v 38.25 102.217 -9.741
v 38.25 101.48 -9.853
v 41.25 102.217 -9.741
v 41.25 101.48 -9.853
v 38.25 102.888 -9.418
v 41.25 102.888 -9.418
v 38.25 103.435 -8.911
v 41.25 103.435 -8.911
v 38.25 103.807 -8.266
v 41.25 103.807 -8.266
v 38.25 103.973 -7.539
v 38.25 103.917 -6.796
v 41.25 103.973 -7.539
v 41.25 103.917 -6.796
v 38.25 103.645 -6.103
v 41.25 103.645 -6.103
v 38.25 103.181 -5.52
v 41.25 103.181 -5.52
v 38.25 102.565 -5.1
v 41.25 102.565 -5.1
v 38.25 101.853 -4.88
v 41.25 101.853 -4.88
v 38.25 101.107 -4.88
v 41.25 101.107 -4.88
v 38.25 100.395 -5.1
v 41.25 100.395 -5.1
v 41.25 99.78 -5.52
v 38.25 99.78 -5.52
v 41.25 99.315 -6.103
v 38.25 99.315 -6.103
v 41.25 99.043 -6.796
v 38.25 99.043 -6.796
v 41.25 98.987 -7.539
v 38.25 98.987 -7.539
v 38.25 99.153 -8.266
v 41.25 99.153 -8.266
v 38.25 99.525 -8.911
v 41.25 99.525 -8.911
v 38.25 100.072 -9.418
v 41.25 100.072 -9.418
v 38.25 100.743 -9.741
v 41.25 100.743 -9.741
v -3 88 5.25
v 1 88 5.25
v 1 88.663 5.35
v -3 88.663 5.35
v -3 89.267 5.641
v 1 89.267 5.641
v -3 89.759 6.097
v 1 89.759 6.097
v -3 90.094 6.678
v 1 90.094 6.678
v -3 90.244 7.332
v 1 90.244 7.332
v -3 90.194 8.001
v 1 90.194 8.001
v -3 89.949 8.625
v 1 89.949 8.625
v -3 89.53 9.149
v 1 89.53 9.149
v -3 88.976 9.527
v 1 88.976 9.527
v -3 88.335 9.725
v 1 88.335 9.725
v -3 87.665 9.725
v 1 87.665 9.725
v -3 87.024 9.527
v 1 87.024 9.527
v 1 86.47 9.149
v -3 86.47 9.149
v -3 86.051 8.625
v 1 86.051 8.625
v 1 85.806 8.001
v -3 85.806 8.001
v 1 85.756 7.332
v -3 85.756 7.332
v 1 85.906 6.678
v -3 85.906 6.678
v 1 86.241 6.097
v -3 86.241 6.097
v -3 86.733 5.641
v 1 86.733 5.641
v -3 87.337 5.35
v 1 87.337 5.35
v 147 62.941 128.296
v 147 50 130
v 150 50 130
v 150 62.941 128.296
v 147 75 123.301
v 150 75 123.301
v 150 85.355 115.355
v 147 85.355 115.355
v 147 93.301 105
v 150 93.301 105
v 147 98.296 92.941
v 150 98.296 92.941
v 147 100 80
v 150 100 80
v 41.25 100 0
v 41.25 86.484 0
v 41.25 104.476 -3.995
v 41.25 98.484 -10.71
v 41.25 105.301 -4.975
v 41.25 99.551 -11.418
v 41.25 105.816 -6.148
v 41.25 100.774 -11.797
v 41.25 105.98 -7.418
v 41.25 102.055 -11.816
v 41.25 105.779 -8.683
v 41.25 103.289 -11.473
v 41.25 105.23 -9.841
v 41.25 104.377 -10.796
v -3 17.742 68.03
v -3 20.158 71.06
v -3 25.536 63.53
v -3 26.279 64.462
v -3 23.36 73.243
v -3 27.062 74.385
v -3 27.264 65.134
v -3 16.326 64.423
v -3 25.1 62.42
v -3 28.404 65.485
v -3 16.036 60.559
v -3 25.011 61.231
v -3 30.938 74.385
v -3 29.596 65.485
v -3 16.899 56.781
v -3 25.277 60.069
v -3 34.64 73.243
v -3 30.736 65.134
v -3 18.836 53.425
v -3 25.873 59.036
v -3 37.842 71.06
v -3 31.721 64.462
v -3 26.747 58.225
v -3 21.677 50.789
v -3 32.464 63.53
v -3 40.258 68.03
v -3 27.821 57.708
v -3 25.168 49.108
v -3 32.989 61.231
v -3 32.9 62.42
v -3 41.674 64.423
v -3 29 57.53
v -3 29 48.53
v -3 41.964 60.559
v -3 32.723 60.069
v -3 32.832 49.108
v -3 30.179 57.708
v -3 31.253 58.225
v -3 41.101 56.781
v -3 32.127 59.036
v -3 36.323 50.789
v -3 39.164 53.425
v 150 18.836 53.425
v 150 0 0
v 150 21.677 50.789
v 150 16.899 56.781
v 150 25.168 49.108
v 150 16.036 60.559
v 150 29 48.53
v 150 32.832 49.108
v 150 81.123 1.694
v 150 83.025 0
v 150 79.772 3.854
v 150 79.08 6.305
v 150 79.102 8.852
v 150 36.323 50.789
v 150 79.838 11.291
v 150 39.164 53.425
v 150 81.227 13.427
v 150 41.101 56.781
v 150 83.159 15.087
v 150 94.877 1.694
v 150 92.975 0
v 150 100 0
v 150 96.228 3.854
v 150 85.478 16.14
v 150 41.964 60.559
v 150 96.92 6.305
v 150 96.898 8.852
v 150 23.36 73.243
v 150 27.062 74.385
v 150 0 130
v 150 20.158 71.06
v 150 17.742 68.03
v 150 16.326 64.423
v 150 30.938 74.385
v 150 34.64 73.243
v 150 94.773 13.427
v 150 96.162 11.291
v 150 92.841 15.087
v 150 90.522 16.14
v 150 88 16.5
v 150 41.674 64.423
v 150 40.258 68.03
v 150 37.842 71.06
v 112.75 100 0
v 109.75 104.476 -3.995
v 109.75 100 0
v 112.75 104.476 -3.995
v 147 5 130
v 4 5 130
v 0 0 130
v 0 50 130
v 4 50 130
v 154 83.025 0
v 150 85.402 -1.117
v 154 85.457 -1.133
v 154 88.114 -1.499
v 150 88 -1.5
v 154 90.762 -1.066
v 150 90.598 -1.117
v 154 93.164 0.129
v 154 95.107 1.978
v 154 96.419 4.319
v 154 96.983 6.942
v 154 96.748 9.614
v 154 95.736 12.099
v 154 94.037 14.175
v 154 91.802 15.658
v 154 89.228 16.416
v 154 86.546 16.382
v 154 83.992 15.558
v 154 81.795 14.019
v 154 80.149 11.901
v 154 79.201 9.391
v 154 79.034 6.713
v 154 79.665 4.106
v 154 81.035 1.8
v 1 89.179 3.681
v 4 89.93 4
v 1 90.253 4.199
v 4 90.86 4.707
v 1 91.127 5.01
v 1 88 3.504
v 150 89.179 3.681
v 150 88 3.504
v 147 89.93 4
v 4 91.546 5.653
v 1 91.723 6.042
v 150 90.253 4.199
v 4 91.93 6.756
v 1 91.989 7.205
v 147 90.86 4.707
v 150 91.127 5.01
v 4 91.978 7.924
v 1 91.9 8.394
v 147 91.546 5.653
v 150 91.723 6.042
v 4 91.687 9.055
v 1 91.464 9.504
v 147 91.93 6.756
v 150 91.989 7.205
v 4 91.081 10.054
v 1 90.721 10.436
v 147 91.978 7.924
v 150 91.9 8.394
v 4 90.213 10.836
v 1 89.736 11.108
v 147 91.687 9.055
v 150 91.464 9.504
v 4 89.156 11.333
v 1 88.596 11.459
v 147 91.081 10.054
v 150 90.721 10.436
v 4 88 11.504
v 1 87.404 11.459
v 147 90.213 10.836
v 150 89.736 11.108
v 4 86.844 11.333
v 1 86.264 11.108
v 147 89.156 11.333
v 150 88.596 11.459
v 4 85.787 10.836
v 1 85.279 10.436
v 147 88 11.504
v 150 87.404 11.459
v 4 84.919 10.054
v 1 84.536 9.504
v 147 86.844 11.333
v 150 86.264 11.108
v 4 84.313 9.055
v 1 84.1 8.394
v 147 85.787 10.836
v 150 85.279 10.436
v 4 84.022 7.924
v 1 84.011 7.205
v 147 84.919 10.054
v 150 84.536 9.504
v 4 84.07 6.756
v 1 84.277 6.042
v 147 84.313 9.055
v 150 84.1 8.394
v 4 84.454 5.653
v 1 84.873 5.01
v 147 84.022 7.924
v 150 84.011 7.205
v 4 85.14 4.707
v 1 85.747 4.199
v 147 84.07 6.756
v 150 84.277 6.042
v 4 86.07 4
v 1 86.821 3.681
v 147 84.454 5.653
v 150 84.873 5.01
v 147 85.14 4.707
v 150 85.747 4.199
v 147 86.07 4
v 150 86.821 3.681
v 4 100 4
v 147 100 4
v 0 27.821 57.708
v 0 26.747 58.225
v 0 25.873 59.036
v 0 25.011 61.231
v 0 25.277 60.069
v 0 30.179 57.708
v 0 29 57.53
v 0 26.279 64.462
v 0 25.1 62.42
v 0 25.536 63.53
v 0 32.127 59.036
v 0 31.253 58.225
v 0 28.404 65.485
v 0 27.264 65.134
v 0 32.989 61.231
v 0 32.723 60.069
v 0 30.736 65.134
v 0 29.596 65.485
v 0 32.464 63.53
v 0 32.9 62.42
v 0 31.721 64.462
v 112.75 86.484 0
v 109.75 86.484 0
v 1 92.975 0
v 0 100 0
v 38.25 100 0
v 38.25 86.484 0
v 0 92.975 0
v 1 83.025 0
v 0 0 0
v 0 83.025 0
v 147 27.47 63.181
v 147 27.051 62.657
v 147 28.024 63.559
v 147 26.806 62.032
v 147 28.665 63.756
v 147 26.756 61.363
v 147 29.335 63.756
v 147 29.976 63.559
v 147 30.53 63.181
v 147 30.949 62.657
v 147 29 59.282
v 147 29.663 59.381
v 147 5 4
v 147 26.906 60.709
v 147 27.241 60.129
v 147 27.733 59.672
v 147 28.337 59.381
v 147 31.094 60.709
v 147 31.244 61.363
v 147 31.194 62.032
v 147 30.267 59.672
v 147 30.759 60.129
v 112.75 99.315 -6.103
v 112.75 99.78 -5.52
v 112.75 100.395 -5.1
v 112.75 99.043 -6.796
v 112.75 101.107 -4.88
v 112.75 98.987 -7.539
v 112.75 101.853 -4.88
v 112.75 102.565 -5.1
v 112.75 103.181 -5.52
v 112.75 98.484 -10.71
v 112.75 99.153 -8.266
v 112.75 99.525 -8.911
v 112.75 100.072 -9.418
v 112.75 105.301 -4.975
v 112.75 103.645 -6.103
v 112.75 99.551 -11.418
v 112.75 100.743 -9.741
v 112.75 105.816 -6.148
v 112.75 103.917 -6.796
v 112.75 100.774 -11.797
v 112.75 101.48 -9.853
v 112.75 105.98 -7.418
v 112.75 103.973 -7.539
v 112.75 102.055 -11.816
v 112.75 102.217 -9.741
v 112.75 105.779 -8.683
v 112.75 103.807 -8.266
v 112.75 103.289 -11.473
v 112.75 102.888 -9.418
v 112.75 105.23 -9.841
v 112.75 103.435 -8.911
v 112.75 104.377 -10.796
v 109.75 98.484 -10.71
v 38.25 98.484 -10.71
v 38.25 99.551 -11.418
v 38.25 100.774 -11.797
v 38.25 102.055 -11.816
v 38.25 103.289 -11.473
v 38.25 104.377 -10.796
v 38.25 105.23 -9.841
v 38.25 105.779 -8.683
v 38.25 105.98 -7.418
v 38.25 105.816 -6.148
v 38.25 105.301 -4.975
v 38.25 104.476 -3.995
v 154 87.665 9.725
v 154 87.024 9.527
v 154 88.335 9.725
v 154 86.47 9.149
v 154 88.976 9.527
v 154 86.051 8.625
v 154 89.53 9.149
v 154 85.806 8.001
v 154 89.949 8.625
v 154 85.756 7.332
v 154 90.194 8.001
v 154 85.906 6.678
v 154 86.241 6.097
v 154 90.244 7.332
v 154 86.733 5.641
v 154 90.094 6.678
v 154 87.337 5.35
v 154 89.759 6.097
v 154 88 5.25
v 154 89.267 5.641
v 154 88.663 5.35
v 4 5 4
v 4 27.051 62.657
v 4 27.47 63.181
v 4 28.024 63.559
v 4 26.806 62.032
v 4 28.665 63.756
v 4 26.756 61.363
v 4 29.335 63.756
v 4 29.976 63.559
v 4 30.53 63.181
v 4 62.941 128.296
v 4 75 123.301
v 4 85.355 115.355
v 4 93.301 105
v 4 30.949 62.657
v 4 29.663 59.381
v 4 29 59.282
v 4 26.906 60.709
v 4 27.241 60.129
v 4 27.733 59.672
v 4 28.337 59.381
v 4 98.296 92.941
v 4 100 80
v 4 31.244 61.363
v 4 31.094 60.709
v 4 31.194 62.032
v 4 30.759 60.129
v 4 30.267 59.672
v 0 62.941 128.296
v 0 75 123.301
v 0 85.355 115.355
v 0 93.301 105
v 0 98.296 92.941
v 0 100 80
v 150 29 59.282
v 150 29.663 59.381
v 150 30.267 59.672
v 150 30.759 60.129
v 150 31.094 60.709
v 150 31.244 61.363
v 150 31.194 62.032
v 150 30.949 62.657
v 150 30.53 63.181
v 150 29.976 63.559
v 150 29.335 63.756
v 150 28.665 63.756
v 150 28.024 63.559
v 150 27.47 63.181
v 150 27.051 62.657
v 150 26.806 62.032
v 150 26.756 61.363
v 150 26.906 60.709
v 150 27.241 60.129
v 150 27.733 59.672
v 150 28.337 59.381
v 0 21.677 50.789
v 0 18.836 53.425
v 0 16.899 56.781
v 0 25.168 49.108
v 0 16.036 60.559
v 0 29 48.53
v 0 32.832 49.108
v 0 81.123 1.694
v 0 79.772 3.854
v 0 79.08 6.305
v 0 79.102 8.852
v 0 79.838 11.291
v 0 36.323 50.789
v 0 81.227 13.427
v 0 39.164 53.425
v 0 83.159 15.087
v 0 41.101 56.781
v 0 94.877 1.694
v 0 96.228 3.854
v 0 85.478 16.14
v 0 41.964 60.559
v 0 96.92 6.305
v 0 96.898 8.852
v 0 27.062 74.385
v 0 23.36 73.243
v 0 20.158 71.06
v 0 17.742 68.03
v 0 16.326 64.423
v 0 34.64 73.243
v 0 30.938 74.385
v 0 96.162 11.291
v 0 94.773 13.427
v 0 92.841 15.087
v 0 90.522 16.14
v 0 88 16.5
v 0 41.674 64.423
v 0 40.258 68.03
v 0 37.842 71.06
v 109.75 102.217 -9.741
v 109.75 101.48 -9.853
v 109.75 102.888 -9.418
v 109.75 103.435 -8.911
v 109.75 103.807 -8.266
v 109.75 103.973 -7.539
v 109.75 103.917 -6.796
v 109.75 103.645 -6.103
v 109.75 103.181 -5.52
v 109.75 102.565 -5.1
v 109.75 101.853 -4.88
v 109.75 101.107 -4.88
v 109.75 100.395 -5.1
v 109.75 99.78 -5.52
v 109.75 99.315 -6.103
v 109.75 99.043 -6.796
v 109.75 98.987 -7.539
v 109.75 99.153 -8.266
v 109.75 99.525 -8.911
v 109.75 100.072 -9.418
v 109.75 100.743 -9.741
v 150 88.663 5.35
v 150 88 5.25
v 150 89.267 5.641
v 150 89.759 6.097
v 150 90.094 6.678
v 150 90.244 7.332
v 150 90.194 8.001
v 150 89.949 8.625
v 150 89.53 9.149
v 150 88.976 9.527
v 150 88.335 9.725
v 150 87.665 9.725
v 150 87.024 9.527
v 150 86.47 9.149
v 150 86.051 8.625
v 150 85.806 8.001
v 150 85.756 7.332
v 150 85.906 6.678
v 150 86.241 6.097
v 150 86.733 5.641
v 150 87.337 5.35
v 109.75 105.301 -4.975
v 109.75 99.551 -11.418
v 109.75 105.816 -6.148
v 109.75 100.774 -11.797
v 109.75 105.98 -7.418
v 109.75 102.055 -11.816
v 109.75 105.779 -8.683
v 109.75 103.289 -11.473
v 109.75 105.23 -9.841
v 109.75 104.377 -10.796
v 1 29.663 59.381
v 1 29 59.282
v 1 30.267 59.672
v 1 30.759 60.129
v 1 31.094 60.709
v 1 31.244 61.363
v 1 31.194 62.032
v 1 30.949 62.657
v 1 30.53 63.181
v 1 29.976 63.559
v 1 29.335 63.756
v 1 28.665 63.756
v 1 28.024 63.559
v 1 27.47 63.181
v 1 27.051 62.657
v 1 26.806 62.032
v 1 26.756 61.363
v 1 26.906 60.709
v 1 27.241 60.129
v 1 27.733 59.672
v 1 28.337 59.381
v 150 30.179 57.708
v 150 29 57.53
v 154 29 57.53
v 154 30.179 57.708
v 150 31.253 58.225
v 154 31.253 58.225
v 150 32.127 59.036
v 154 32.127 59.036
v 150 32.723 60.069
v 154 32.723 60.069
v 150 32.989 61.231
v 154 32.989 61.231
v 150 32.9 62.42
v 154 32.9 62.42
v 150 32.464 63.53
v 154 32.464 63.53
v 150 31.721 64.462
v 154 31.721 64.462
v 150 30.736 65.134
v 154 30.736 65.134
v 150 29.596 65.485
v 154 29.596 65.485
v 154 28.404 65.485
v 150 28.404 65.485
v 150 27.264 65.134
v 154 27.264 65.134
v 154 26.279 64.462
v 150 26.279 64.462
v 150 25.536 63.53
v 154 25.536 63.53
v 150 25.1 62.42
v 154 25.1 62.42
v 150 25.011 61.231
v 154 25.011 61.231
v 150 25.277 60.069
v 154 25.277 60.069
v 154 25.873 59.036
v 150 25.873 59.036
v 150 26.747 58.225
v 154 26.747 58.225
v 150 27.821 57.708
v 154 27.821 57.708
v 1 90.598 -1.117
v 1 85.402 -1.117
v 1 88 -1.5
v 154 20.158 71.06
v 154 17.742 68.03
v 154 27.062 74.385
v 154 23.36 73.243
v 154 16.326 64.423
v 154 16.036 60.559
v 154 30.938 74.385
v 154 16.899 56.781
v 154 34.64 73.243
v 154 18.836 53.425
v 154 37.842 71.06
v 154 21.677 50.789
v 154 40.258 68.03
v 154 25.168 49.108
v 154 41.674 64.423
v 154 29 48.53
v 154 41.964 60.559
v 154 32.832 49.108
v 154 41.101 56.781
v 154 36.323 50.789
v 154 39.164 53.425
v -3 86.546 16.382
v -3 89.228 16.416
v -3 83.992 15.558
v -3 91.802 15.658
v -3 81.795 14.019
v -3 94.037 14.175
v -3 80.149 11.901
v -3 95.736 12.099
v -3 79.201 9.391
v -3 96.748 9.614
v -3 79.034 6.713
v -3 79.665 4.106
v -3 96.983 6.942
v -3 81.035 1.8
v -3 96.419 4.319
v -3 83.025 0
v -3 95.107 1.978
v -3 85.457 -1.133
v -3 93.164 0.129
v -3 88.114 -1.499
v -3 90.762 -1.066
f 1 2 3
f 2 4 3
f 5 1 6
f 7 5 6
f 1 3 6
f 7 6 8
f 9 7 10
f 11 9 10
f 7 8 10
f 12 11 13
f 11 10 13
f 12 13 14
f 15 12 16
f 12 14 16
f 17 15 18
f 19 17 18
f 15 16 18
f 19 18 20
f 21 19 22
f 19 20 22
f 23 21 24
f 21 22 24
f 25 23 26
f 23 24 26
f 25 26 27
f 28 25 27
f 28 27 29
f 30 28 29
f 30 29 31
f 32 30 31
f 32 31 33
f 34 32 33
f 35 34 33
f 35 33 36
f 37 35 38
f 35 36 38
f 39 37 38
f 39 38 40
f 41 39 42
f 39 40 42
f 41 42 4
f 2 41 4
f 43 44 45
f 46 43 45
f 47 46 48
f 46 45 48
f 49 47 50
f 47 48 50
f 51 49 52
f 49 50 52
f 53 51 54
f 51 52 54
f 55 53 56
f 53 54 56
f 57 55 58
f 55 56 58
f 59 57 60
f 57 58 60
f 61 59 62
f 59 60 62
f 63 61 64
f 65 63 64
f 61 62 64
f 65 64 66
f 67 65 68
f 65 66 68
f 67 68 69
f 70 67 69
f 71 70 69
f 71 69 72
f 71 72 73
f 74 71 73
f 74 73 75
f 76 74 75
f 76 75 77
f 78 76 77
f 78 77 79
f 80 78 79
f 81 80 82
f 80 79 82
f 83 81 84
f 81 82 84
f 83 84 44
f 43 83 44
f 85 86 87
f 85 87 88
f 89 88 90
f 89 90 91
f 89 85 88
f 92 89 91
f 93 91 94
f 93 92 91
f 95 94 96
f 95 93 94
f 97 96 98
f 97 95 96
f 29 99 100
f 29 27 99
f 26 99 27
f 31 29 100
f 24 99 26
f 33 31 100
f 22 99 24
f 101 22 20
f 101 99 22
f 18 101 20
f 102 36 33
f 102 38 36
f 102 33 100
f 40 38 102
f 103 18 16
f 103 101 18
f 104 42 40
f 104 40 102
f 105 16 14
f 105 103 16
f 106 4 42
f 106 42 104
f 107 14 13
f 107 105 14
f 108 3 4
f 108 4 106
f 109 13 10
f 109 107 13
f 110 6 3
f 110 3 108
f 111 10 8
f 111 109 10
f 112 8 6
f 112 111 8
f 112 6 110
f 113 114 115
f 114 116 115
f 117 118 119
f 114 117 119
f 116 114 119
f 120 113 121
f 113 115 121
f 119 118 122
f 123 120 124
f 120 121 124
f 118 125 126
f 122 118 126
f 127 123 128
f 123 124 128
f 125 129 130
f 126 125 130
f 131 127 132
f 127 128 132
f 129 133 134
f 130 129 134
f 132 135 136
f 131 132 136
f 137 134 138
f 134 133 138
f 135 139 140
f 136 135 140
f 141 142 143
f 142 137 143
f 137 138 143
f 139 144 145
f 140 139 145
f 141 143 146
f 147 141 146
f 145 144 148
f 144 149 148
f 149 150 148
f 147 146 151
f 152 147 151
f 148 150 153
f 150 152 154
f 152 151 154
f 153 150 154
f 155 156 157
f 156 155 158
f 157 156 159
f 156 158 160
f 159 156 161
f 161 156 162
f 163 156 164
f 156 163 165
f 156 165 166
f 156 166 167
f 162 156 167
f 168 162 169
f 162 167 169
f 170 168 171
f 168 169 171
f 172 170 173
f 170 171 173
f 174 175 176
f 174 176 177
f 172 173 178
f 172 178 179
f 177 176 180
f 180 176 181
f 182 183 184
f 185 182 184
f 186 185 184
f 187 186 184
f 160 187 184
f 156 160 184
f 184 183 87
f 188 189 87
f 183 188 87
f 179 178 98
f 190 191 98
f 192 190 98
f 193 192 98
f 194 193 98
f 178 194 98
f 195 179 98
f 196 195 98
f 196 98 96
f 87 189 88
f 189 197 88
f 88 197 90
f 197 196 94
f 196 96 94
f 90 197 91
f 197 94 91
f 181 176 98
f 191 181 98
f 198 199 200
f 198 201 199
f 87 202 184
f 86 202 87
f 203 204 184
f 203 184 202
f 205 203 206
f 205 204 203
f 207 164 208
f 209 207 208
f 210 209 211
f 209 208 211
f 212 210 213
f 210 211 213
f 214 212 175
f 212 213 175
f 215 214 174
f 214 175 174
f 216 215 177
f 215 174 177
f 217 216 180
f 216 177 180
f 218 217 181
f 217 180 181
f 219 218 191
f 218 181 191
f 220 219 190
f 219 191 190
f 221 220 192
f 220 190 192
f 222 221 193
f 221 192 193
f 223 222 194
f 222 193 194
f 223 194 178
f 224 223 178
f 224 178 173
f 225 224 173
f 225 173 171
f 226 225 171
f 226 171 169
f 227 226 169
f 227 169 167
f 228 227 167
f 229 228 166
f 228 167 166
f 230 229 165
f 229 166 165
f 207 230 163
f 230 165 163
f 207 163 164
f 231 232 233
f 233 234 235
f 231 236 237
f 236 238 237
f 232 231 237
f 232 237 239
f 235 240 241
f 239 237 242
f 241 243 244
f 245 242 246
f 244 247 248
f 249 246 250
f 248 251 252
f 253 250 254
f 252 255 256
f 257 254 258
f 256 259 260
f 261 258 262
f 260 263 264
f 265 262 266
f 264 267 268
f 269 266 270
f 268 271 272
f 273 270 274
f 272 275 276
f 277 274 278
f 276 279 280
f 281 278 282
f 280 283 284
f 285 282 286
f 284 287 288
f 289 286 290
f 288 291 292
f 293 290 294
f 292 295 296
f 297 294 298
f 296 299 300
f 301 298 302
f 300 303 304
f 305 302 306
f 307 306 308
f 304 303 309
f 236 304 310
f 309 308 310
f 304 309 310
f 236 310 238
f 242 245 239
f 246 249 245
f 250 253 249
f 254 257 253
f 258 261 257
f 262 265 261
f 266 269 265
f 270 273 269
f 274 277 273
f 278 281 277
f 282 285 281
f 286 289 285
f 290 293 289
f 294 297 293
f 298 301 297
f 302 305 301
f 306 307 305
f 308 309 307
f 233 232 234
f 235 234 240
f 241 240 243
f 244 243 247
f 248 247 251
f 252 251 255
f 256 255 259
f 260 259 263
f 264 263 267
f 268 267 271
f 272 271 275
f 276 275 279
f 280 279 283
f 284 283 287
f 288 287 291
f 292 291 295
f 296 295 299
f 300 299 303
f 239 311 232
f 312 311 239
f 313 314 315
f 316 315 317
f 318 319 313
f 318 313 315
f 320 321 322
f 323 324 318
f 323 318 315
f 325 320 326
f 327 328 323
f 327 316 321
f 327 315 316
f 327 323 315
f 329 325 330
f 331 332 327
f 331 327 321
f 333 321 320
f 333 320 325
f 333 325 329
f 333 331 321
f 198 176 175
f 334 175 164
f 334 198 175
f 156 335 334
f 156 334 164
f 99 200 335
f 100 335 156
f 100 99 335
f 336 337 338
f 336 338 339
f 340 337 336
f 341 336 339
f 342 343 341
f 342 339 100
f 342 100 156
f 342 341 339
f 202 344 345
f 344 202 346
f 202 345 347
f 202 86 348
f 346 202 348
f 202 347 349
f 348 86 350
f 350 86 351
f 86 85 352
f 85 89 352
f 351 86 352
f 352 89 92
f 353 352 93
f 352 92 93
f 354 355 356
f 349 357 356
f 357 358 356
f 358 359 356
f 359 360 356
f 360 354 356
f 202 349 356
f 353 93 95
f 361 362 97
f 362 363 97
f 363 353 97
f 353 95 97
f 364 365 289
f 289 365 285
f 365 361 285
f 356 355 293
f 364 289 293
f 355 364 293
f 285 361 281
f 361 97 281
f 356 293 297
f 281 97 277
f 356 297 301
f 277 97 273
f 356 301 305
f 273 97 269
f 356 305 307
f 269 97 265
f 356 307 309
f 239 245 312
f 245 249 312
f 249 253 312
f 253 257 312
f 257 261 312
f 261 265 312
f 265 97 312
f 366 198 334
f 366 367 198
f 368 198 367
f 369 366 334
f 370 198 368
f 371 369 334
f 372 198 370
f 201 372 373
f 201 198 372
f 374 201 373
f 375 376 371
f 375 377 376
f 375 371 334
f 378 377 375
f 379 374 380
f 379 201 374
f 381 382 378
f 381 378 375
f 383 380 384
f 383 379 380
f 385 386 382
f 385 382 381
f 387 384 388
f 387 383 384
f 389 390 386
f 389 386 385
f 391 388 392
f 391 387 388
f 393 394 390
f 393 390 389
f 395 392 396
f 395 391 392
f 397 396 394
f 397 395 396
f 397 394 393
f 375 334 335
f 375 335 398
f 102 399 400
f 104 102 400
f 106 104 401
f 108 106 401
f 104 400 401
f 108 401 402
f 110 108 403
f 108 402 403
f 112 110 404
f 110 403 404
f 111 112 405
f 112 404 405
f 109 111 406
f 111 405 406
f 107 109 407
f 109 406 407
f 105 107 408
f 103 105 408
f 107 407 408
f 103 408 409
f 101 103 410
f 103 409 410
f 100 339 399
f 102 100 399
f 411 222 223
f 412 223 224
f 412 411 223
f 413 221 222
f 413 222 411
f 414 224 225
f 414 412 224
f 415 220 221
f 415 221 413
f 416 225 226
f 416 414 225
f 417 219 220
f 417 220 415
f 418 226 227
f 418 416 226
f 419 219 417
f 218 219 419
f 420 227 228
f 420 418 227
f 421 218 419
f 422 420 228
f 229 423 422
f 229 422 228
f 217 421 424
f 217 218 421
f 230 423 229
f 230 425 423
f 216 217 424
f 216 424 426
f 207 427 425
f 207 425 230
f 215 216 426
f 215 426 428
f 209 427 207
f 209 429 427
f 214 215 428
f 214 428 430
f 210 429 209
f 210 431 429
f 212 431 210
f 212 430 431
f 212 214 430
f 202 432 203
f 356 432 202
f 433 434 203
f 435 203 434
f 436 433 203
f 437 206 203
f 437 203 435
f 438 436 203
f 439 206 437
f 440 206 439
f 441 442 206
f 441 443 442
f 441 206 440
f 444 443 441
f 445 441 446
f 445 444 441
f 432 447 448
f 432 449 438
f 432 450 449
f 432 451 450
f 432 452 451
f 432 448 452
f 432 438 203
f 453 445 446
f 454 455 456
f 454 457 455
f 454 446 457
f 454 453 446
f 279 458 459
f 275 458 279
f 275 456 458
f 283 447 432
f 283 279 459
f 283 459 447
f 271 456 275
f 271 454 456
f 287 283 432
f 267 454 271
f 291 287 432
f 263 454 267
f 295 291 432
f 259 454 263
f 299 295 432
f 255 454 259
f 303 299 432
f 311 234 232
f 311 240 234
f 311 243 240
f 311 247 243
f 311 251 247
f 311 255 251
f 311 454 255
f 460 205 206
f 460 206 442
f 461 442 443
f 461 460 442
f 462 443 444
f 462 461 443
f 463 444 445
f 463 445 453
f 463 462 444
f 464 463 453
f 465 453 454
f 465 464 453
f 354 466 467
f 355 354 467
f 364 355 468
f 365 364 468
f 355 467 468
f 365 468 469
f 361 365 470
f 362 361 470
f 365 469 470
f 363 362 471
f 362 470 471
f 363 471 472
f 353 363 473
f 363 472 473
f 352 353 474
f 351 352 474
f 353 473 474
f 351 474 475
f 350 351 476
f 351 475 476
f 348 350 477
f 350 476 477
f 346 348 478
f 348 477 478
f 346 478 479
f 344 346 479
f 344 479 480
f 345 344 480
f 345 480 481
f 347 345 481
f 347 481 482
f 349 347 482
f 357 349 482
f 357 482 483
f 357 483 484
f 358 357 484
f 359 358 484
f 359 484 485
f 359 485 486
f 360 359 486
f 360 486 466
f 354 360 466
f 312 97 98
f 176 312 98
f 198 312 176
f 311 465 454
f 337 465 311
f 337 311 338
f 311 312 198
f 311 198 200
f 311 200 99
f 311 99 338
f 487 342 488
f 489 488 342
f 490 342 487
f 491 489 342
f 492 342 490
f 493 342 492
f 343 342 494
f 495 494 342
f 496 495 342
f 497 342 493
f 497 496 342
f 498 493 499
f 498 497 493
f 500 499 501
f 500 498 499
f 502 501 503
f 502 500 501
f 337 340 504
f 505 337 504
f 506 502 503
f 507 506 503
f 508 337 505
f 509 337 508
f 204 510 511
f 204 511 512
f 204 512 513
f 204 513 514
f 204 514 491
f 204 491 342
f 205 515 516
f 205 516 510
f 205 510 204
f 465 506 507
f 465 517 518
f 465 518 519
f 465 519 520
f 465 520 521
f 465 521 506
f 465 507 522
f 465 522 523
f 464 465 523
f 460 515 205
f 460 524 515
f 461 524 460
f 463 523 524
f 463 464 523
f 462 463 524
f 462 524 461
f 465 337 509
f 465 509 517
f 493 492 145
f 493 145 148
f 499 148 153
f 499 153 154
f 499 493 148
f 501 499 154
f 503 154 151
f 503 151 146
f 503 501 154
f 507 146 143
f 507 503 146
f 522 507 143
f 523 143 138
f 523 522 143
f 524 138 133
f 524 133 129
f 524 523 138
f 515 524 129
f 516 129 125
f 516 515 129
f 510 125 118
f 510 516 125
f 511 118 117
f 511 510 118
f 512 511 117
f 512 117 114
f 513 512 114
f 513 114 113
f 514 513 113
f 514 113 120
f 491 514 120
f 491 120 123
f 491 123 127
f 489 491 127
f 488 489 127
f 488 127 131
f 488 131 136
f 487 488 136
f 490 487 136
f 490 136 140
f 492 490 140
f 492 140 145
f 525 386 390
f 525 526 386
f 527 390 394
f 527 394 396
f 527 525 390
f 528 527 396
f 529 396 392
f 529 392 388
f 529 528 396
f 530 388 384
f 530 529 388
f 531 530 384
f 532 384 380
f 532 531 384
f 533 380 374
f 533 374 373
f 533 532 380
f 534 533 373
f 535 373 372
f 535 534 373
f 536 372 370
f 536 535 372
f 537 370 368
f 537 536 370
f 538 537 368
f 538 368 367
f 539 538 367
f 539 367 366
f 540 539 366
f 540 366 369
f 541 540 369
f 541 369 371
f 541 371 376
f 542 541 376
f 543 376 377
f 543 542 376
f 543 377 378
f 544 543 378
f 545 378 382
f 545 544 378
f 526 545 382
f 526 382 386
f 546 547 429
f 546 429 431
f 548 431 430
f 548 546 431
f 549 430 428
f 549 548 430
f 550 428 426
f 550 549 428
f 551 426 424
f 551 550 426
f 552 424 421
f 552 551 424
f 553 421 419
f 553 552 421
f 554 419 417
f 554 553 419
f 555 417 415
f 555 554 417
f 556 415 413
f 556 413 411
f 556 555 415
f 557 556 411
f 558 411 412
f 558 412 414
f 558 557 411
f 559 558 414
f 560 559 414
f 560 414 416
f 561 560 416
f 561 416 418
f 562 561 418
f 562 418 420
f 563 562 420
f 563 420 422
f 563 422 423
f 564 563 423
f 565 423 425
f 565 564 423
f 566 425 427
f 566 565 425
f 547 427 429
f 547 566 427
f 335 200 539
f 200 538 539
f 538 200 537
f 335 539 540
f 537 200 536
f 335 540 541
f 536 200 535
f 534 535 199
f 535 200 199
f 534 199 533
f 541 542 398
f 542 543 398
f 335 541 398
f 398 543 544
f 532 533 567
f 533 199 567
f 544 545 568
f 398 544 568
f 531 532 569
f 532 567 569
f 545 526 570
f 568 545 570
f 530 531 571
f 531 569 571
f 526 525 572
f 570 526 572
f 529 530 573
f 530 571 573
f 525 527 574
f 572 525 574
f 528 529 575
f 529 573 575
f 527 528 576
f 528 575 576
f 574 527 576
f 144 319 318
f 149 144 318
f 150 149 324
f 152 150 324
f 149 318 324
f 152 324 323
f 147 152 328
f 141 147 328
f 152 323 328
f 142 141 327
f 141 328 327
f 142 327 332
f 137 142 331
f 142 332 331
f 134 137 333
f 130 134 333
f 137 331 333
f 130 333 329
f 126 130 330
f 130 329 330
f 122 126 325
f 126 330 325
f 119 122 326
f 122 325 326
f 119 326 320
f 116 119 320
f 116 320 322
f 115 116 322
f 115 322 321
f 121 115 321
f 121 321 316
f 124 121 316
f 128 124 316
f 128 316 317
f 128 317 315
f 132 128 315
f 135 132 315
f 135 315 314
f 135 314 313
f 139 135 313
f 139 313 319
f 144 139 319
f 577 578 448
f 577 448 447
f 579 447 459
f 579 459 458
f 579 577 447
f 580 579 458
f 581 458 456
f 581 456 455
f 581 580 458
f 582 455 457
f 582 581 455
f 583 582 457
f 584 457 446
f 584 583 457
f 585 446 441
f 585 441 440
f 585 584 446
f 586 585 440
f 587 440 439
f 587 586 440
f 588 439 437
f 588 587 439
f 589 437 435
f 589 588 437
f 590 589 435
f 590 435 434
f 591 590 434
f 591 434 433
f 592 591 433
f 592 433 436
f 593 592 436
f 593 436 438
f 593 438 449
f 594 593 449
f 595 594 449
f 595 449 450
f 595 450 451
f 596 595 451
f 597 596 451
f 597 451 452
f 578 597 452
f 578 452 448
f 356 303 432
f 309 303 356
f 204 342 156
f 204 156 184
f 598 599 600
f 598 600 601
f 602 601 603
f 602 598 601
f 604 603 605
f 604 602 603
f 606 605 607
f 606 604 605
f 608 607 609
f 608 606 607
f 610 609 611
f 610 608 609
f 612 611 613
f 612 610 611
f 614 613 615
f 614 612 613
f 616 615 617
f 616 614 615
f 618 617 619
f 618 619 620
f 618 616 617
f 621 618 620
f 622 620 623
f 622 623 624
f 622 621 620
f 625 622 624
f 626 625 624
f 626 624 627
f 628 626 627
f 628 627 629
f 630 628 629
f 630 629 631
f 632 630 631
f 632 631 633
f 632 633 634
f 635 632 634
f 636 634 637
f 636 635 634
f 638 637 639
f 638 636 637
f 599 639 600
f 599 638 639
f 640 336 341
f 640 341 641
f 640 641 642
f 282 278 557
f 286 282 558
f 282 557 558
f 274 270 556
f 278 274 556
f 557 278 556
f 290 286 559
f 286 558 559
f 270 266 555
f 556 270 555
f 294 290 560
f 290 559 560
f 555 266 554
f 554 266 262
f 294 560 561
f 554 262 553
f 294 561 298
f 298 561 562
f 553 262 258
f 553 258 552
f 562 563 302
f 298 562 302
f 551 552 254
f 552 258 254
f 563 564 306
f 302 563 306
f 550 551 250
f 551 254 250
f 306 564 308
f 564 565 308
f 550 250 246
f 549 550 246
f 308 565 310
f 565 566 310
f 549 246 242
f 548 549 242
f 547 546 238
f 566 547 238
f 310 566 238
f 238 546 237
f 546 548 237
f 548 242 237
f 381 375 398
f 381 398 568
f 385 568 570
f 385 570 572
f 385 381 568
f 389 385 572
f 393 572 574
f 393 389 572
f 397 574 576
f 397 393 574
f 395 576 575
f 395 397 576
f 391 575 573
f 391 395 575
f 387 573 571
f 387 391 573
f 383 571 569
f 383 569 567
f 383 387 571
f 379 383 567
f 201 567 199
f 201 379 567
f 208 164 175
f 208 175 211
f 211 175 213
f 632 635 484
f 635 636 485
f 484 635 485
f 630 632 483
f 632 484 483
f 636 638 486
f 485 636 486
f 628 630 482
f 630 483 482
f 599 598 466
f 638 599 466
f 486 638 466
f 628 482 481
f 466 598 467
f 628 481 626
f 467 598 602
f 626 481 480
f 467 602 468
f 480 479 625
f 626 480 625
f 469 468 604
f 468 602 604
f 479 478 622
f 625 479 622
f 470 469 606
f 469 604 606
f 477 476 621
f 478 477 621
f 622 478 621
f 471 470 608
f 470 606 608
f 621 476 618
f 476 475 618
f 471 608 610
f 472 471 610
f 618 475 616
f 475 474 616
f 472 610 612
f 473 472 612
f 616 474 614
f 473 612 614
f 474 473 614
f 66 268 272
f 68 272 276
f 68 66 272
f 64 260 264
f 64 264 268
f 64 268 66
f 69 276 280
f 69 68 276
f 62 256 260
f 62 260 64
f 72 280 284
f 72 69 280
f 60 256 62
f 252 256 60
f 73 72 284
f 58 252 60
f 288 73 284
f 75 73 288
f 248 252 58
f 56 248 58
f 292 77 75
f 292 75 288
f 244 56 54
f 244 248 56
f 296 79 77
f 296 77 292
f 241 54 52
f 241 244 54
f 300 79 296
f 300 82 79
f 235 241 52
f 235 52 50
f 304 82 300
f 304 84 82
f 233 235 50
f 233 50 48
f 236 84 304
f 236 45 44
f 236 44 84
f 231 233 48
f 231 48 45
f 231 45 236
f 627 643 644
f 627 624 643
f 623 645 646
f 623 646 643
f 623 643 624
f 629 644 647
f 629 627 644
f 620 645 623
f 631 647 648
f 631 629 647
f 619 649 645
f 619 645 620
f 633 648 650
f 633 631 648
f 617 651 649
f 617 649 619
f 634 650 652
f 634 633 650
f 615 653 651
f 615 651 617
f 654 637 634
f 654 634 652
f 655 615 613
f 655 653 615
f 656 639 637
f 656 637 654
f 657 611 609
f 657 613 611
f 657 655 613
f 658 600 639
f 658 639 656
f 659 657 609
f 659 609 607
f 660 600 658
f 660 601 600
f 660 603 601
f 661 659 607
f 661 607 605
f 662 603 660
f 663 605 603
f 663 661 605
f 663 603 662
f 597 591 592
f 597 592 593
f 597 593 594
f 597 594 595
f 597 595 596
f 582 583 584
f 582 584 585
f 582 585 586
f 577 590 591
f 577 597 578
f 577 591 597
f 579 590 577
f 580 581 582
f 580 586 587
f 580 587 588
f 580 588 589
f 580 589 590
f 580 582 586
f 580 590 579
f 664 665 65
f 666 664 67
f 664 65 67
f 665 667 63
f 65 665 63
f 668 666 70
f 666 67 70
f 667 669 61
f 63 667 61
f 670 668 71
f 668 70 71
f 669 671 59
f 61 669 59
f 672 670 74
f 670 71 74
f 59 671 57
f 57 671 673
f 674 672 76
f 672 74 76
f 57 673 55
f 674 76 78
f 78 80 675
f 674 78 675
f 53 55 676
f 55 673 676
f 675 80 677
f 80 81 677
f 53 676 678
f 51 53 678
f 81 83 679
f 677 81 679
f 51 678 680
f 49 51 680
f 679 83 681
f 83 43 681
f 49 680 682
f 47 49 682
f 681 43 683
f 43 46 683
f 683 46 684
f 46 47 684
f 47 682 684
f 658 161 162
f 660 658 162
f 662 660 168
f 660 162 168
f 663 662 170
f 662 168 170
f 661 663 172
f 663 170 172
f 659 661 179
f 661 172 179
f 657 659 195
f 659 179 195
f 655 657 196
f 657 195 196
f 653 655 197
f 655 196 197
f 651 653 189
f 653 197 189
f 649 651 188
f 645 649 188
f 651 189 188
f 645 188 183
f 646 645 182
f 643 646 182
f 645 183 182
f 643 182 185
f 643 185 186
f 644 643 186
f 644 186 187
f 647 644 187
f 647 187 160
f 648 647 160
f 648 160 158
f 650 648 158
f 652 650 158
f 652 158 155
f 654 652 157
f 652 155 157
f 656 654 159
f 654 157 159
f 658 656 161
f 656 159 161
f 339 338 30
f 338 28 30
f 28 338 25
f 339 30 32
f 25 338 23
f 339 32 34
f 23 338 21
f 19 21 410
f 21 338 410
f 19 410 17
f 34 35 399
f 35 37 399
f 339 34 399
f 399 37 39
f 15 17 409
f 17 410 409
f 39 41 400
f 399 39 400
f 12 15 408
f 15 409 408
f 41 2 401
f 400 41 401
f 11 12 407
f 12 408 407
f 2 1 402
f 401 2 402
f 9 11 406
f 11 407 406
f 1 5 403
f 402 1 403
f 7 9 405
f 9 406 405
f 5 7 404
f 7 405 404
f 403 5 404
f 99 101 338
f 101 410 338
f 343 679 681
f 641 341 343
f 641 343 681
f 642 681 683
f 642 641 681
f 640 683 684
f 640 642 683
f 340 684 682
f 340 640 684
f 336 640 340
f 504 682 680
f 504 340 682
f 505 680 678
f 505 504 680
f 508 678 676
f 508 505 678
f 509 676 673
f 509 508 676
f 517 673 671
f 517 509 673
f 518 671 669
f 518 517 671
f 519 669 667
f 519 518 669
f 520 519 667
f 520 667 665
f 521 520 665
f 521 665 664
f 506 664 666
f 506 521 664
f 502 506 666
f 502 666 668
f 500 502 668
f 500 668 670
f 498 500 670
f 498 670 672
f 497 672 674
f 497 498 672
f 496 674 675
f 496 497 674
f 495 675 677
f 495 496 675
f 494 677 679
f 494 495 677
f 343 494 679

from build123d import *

# Parameters (mm, degrees)
BOSS_EXTRUDE1_DEPTH = 150
SKETCH2_W           = 143
SKETCH2_H           = 131
CUT_EXTRUDE1_DEPTH  = 95
SKETCH3_R           = 2.5
BOSS_EXTRUDE2_DEPTH = 1.5
CUT_EXTRUDE2_REACH  = 227.015
SKETCH4_R           = 2.25
SKETCH4_R_2         = 4
SKETCH5_R           = 9
SKETCH5_R_2         = 2.25
SKETCH5_R_3         = 13
SKETCH5_R_4         = 4
BOSS_EXTRUDE3_DEPTH = 4


with BuildPart() as part:
    # Sketch1 → Boss-Extrude1 (new body)
    with BuildSketch(Plane(origin=(0, 0, 0), x_dir=(0, 0, -1), z_dir=(1, 0, 0))):
        with BuildLine():
            Line((0, 0), (-130, 0))
            Line((-130, 0), (-130, 50))
            ThreePointArc((-130, 50), (-115.355339059, 85.355339059), (-80, 100))
            Line((-80, 100), (0, 100))
            Line((0, 100), (0, 0))
        make_face()
    extrude(amount=BOSS_EXTRUDE1_DEPTH)

    # Sketch2 → Cut-Extrude1 (cut)
    with BuildSketch(Plane(origin=(0, 100, 0), x_dir=(1, 0, 0), z_dir=(0, 1, 0))):
        with Locations((75.5, -69.5)):
            Rectangle(SKETCH2_W, SKETCH2_H)
    extrude(amount=-CUT_EXTRUDE1_DEPTH, mode=Mode.SUBTRACT)

    # Sketch3 → Boss-Extrude2 (add, symmetric)
    with BuildSketch(Plane(origin=(111.25, 0, 0), x_dir=(0, 0, -1), z_dir=(1, 0, 0))):
        with BuildLine():
            Line((0, 100), (0, 86.483689179))
            Line((0, 86.483689179), (10.709846007, 98.483689179))
            ThreePointArc((10.709846007, 98.483689179), (10.348889249, 104.837405432), (3.995172996, 104.476448674))
            Line((3.995172996, 104.476448674), (0, 100))
        make_face()
        with Locations((7.352509502, 101.480068927)):
            Circle(SKETCH3_R, mode=Mode.SUBTRACT)
    boss_extrude2 = extrude(amount=BOSS_EXTRUDE2_DEPTH, both=True)

    # Mirror1: Boss-Extrude2 across plane
    add(boss_extrude2.mirror(Plane(origin=(75.5, 0, 0), x_dir=(0, 0, 1), z_dir=(1, 0, 0))))

    # Sketch4 → Cut-Extrude2 (cut, up to next)
    with BuildSketch(Plane(origin=(150, 0, 0), x_dir=(0, 0, -1), z_dir=(1, 0, 0)), mode=Mode.PRIVATE) as cut_extrude2_sk1:
        with Locations((-61.531516432, 29)):
            Circle(SKETCH4_R)
    cut_extrude2_tool1 = extrude(cut_extrude2_sk1.sketch, amount=-CUT_EXTRUDE2_REACH, mode=Mode.PRIVATE) & part.part
    # Sketch4 → Cut-Extrude2 (cut, up to next)
    with BuildSketch(Plane(origin=(150, 0, 0), x_dir=(0, 0, -1), z_dir=(1, 0, 0)), mode=Mode.PRIVATE) as cut_extrude2_sk2:
        with Locations((-7.503745795, 88)):
            Circle(SKETCH4_R_2)
    cut_extrude2_tool2 = extrude(cut_extrude2_sk2.sketch, amount=-CUT_EXTRUDE2_REACH, mode=Mode.PRIVATE) & part.part
    cut_extrude2_1 = cut_extrude2_tool1.solids().sort_by_distance((150, 29, 61.531516))[0]
    add(cut_extrude2_1, mode=Mode.SUBTRACT)
    cut_extrude2_2 = cut_extrude2_tool2.solids().sort_by_distance((150, 88, 7.503746))[0]
    add(cut_extrude2_2, mode=Mode.SUBTRACT)
    cut_extrude2 = cut_extrude2_1 + cut_extrude2_2  # Cut-Extrude2 as one shape, for the pattern or mirror that repeats it

    # Mirror2: Cut-Extrude2 across plane
    add(cut_extrude2.mirror(Plane(origin=(75.5, 0, 0), x_dir=(0, 0, 1), z_dir=(1, 0, 0))), mode=Mode.SUBTRACT)

    # Sketch5 → Boss-Extrude3 (add)
    # profile 1 of 2: a face of its own
    with BuildSketch(Plane(origin=(150, 0, 0), x_dir=(0, 0, -1), z_dir=(1, 0, 0))):
        with Locations(Location((-7.5, 88, 0), (0, 0, 326.442690238))):
            Circle(SKETCH5_R)
        with Locations((-7.5, 88)):
            Circle(SKETCH5_R_2, mode=Mode.SUBTRACT)
    # profile 2 of 2: a face of its own
    with BuildSketch(Plane(origin=(150, 0, 0), x_dir=(0, 0, -1), z_dir=(1, 0, 0))):
        with Locations((-61.53, 29)):
            Circle(SKETCH5_R_3)
        with Locations((-61.53, 29)):
            Circle(SKETCH5_R_4, mode=Mode.SUBTRACT)
    boss_extrude3 = extrude(amount=BOSS_EXTRUDE3_DEPTH)

    # Mirror3: Boss-Extrude3 across plane
    add(boss_extrude3.mirror(Plane(origin=(75.5, 0, 0), x_dir=(0, 0, 1), z_dir=(1, 0, 0))))


solid = part.part
